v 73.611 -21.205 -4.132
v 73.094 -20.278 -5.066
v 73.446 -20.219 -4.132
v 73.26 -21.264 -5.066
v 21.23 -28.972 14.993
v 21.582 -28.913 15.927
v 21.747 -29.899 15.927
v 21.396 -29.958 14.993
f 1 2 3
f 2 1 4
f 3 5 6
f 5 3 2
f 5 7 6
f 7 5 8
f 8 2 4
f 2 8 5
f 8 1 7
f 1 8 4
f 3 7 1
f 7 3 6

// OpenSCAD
/* 
draw continous solid from one wertex to the next by 
extruding a cube of side s oriented towards its target
*/

include <cube.scad>;

$fn =3;s =5;f=-.4*s;r=.2;coloring = 400;trans = .1;

CubePoints = [
  [  -.5 * s, -.5 * s, -.5 * s ],  //0
  [   .5 * s, -.5 * s, -.5 * s ],  //1
  [   .5 * s,  .5 * s, -.5 * s ],  //2
  [  -.5 * s,  .5 * s, -.5 * s ],  //3
  [  -.5 * s, -.5 * s,  .5 * s ],  //4
  [   .5 * s, -.5 * s,  .5 * s ],  //5
  [   .5 * s,  .5 * s,  .5 * s ],  //6
  [  -.5 * s,  .5 * s,  .5 * s ]]; //7
  
CubeFaces = [
  [0,1,2,3],  // bottom
  [4,5,1,0],  // front
  [7,6,5,4],  // top
  [5,6,2,1],  // right
  [6,7,3,2],  // back
  [7,4,0,3]]; // left

for (i = [0 : 1 : (($t*1001) % (len(w)-2))])
    scale(v = [r,r,r])
        if (norm(w[i]-w[i+1]) > 0) 
            translate((w[i]+w[i+1])/2)
                rotate([0,acos(((w[i+1]-w[i])[2])/(norm(w[i]-w[i+1]))),atan2(((w[i+1]-w[i])[1]),((w[i+1]-w[i])[0]))])
                    scale(v = [1,1,(norm(w[i]-w[i+1])+f)/s])
                        color(c = [abs(w[i][0]/coloring),abs(w[i][1]/coloring),abs(w[i][2]/coloring)],alpha=(1-$t))
                            polyhedron( CubePoints, CubeFaces );
